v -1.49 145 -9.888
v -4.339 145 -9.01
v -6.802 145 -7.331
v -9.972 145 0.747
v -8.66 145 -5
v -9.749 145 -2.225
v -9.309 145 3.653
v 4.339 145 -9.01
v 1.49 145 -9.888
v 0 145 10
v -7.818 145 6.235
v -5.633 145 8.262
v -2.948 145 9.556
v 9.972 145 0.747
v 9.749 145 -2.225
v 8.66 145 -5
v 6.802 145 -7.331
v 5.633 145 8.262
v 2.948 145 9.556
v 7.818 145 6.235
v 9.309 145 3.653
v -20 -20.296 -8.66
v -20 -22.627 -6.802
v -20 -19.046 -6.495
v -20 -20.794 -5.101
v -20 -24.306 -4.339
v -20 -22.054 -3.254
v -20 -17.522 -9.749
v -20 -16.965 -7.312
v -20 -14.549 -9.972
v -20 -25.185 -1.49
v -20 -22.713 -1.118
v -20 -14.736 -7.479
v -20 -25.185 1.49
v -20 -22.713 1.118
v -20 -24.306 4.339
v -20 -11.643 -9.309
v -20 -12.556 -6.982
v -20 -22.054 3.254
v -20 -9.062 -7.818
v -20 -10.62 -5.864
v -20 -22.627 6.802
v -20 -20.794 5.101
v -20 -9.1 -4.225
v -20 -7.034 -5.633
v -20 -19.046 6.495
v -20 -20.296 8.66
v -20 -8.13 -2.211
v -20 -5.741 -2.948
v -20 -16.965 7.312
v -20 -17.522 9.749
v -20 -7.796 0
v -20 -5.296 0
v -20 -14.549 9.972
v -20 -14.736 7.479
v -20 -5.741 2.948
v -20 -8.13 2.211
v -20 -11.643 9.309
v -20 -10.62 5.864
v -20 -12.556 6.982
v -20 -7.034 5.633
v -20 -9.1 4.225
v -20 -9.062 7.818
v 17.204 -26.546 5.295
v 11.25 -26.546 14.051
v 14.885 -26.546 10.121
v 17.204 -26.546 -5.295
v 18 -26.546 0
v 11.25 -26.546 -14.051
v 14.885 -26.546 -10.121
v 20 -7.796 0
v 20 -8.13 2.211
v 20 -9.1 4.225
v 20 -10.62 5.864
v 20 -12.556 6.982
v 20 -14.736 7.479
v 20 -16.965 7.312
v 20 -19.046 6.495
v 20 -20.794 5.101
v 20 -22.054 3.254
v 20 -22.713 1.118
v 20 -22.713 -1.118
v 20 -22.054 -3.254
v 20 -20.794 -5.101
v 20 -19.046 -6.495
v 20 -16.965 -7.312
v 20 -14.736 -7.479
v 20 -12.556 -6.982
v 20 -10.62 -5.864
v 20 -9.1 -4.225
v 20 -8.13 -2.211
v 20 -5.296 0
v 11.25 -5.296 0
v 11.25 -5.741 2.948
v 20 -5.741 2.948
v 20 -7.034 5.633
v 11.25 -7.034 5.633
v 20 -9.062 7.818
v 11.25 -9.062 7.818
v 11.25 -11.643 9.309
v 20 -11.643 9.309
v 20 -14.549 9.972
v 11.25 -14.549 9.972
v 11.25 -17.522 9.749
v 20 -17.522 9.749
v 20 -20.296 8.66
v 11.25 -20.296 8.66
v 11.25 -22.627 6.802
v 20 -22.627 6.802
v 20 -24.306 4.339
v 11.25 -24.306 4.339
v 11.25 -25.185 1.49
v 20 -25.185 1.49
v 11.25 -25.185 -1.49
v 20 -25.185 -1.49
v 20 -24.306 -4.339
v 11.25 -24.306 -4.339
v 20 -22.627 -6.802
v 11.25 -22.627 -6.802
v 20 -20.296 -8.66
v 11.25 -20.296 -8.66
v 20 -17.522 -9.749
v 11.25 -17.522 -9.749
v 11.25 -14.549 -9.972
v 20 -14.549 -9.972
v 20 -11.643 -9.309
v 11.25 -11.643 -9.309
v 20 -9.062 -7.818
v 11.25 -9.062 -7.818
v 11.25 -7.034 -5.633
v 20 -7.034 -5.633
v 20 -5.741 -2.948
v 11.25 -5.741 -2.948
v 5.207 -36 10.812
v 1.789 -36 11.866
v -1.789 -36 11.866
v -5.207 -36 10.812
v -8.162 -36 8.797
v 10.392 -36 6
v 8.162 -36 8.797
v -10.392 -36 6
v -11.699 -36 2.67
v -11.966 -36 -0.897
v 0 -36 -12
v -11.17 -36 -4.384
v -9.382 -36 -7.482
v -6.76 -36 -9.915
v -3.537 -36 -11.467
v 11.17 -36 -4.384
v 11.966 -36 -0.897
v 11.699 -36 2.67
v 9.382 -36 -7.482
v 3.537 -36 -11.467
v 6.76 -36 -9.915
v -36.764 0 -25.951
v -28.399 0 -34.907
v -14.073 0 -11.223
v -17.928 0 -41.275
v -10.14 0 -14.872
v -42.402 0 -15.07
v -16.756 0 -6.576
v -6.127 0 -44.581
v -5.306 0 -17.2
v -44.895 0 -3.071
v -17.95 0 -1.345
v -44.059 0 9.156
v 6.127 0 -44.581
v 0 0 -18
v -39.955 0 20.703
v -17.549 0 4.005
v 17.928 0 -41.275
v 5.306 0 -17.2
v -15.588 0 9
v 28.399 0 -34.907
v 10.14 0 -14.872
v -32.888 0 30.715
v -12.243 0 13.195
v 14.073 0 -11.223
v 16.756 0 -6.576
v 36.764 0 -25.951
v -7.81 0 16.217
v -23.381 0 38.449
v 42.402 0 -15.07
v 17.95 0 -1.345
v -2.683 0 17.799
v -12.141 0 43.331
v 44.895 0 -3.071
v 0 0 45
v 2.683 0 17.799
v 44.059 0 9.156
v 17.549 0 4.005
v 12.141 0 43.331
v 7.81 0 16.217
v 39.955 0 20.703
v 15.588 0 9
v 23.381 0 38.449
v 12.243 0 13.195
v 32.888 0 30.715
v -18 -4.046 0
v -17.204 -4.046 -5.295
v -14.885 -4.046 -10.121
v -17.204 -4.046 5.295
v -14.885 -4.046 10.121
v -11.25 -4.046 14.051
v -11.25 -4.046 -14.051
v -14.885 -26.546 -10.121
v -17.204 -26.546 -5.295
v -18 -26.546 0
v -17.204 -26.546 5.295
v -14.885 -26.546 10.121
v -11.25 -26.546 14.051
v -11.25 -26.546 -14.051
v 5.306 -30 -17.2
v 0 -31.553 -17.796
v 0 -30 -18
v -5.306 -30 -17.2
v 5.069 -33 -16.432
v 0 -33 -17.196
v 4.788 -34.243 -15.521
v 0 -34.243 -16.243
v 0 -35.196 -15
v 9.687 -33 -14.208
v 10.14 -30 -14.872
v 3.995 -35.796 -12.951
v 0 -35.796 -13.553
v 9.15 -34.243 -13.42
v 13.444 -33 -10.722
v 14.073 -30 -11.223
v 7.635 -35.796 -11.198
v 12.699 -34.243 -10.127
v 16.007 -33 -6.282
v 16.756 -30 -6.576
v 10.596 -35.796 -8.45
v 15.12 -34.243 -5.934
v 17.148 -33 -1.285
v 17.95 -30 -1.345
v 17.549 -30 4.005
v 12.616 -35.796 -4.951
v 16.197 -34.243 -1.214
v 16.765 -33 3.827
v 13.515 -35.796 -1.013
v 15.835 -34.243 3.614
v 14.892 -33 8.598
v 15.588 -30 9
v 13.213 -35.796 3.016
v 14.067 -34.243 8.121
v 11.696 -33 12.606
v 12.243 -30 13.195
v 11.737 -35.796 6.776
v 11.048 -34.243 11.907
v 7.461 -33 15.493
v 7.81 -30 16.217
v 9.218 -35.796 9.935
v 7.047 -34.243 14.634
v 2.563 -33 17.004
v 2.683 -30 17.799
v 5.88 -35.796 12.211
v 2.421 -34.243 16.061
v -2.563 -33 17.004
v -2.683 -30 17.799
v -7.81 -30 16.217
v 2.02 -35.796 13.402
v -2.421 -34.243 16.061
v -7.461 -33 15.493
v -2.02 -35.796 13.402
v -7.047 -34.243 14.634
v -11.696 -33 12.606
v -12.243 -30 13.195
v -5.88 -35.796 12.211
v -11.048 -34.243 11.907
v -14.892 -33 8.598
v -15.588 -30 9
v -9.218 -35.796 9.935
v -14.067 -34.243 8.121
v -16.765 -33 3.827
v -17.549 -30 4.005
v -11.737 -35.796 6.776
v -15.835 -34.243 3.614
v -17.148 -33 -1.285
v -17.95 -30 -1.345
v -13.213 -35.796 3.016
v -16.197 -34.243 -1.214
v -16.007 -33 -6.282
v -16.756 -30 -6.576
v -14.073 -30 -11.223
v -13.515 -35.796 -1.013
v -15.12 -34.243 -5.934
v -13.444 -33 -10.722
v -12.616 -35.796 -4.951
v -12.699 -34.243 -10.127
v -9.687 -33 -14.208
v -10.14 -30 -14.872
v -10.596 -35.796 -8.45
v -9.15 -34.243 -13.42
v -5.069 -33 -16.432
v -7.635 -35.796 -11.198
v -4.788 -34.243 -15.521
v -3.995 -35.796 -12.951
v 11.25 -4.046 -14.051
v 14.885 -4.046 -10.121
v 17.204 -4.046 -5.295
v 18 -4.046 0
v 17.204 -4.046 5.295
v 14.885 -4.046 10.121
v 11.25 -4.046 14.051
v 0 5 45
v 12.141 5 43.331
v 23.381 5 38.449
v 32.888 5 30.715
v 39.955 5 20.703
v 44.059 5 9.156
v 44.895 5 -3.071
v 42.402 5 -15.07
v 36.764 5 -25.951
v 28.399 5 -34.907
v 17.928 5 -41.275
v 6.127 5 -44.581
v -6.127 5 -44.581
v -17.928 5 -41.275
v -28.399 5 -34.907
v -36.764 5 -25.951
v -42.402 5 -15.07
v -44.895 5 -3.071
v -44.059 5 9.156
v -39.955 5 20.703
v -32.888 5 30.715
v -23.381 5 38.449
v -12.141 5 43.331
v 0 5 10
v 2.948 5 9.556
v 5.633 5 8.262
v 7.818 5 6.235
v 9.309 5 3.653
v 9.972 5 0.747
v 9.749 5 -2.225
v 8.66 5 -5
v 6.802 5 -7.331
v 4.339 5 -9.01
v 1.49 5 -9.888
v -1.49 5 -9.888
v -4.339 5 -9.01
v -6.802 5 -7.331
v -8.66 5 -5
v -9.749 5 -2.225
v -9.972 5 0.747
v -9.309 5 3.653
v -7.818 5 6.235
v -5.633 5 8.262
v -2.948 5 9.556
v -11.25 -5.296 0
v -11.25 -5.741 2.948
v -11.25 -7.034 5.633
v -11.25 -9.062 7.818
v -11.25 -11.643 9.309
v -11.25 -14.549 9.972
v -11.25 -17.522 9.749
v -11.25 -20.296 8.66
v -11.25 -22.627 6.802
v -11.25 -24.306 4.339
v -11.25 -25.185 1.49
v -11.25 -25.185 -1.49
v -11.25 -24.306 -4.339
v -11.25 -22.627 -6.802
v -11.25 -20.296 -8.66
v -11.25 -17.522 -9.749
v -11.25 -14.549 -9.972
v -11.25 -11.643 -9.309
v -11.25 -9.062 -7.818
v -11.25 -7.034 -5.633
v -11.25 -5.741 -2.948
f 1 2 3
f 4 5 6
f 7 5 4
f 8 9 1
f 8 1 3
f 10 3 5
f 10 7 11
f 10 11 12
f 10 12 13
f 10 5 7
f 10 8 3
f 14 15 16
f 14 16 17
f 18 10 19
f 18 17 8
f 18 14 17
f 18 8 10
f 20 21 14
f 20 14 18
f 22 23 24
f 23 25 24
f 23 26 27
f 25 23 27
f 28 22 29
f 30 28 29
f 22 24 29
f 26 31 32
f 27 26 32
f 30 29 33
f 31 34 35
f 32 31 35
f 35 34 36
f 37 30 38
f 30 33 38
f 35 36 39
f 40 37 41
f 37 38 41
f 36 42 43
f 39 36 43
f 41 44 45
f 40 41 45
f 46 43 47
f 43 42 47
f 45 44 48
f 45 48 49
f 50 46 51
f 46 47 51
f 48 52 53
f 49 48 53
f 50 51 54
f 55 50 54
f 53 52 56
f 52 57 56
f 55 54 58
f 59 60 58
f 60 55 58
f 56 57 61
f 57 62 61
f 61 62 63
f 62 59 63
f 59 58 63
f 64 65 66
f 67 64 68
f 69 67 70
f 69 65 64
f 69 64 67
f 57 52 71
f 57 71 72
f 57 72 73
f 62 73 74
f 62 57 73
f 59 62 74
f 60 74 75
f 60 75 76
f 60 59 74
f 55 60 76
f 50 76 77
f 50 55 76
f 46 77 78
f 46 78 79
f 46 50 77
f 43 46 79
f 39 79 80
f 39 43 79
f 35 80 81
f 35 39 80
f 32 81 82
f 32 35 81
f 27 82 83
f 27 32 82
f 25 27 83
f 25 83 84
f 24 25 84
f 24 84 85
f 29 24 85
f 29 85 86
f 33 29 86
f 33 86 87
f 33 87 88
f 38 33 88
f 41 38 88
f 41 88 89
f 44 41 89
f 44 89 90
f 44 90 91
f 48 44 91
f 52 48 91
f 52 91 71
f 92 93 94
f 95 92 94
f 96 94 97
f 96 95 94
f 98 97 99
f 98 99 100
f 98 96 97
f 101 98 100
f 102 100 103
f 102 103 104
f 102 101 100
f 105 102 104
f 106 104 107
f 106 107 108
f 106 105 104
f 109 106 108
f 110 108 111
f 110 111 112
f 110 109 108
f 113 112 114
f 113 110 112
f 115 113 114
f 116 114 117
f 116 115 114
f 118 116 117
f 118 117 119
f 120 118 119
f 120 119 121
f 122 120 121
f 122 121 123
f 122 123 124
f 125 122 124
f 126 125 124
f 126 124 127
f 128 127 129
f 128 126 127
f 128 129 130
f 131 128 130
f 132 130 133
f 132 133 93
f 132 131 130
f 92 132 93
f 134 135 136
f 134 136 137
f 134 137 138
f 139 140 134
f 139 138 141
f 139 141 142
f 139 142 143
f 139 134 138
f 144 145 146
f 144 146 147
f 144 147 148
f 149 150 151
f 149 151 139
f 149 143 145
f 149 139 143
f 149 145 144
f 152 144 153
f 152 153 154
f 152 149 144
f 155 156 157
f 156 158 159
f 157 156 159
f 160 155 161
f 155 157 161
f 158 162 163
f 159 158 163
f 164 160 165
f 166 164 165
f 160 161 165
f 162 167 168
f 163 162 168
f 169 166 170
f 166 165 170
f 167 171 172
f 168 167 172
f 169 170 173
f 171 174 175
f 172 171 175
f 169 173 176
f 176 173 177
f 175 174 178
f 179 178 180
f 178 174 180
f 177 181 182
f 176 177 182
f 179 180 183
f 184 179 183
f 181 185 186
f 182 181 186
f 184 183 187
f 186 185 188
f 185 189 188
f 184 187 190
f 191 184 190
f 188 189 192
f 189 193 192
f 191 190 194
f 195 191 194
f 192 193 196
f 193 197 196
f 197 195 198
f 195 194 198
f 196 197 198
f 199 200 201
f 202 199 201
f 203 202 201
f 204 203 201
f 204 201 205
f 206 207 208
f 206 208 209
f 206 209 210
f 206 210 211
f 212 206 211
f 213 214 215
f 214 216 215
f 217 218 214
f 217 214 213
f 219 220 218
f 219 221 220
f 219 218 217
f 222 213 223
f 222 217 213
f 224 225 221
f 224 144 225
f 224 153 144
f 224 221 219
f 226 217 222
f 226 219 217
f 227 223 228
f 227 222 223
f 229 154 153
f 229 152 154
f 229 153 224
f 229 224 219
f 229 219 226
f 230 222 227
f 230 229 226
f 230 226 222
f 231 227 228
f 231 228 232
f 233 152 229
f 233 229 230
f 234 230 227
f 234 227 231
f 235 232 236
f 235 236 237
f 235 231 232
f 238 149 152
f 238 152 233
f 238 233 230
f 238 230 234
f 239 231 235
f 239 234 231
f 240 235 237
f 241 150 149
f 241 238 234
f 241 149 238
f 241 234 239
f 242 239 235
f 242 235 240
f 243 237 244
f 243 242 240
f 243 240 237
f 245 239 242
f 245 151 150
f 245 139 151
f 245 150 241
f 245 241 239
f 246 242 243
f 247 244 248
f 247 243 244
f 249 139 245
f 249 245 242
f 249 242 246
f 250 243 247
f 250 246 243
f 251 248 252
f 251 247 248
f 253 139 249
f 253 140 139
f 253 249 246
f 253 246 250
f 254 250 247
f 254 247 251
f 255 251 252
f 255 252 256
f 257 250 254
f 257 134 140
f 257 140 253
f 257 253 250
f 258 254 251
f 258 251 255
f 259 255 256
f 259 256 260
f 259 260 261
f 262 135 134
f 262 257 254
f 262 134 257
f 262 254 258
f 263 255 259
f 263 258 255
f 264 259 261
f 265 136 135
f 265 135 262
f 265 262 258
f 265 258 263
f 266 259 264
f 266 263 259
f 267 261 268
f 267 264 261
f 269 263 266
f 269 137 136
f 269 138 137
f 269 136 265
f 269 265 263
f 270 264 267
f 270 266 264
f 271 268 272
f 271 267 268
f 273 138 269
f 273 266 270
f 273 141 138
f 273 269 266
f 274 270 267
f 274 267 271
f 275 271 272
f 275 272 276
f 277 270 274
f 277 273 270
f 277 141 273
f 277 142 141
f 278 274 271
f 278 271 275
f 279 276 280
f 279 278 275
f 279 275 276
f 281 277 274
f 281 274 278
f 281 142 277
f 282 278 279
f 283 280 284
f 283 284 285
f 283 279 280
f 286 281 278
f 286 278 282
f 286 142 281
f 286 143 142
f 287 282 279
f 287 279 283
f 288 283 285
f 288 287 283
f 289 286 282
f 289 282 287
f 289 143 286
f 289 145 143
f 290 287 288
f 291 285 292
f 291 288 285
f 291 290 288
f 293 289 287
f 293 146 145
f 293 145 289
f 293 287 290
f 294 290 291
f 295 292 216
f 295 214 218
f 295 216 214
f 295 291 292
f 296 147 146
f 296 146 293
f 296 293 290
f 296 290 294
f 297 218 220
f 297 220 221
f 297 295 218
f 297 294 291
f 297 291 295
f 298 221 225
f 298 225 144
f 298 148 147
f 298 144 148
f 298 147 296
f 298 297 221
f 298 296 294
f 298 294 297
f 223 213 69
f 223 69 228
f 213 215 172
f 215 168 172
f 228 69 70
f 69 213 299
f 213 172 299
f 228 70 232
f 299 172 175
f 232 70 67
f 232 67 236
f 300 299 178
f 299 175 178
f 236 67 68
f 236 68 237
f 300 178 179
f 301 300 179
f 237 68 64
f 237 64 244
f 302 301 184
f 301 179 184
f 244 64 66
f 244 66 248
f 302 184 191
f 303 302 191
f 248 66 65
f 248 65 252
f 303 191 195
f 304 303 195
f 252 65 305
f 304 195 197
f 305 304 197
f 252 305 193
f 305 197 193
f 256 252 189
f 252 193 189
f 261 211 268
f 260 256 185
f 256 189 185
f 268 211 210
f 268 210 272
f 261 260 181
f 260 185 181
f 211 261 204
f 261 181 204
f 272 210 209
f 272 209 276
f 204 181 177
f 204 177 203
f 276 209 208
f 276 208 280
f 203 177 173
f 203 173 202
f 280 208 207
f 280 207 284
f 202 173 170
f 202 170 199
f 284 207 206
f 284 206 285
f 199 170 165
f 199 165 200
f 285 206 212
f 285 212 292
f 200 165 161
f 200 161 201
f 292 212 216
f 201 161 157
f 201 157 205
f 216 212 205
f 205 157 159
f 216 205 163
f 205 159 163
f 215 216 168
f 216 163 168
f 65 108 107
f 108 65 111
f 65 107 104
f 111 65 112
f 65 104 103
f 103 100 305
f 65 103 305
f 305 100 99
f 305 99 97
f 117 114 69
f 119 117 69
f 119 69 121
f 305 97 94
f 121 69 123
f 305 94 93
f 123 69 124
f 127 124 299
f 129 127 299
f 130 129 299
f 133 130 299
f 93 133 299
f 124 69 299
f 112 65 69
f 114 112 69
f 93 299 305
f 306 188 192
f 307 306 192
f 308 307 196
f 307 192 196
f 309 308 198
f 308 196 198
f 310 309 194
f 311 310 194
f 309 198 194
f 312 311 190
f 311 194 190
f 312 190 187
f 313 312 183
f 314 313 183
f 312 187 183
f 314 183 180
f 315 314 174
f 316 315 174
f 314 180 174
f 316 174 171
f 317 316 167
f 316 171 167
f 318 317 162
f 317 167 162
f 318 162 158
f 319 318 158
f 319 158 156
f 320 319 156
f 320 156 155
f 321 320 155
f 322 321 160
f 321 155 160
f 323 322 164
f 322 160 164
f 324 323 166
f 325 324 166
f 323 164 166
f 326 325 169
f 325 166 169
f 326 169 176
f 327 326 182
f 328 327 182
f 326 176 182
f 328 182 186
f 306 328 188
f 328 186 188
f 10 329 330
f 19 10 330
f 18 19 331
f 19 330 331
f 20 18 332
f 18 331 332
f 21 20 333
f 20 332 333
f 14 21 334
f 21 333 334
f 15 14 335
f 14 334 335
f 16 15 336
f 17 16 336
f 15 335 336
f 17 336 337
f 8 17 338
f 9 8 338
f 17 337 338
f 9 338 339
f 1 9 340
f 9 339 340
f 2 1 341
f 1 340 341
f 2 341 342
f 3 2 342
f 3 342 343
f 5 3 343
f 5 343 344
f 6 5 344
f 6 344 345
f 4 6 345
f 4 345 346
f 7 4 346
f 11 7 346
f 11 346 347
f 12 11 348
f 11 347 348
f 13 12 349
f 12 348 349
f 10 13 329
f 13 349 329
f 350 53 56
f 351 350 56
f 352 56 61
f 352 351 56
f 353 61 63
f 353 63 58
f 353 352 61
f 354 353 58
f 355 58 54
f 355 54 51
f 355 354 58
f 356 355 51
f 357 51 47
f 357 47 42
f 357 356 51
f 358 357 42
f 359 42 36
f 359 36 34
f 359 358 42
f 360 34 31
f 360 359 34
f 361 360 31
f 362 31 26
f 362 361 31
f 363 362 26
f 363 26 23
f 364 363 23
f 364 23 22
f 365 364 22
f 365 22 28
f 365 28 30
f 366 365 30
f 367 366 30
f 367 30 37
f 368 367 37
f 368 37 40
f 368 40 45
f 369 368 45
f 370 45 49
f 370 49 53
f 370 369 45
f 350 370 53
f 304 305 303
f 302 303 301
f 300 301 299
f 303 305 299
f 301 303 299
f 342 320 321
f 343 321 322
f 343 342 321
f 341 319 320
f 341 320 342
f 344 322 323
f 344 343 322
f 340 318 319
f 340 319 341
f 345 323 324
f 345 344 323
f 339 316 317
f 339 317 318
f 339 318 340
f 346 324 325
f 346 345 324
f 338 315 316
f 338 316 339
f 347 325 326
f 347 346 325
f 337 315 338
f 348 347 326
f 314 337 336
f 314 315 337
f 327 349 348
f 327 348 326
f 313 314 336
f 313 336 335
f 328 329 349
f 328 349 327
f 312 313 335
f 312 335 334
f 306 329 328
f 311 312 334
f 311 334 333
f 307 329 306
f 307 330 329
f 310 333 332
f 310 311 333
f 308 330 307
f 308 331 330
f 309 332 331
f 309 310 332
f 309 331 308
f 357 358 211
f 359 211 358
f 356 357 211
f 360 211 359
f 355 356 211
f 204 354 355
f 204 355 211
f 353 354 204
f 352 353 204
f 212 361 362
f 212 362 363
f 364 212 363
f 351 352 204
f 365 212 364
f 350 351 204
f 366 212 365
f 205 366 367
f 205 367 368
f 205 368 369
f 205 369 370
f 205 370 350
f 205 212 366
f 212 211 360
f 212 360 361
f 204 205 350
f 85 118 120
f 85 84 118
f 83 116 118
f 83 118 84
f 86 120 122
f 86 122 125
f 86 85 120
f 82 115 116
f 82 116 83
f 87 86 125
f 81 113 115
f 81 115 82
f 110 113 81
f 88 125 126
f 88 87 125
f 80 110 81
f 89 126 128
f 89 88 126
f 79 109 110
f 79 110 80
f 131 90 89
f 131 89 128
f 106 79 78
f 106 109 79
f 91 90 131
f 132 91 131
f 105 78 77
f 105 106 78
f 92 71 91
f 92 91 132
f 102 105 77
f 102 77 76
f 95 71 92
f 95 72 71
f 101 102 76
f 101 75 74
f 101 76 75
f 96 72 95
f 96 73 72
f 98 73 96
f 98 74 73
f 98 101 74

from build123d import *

# Parameters (mm, degrees)
SKETCH1_R               = 45
BOSS_EXTRUDE1_DEPTH     = 5
SKETCH2_R               = 10
BOSS_EXTRUDE2_DEPTH     = 140
SKETCH3_R               = 18
BOSS_EXTRUDE3_DEPTH     = 36
FILLET1_R               = 6
CUT_EXTRUDE1_DEPTH      = 159.350876221
CUT_EXTRUDE1_DEPTH_BACK = 159.350876221
SKETCH4_W               = 21.648814377
SKETCH4_H               = 22.5
SKETCH5_R               = 7.5
CUT_EXTRUDE2_DEPTH      = 162.907573943
SKETCH7_R               = 10
SKETCH7_R_2             = 7.5
BOSS_EXTRUDE4_DEPTH     = 20


with BuildPart() as part:
    # Sketch1 → Boss-Extrude1 (new body)
    with BuildSketch(Plane(origin=(0, 0, 0), x_dir=(1, 0, 0), z_dir=(0, 1, 0))):
        with Locations(Location((0, 0, 0), (0, 0, 270))):
            Circle(SKETCH1_R)
    extrude(amount=BOSS_EXTRUDE1_DEPTH)

    # Sketch2 → Boss-Extrude2 (add)
    with BuildSketch(Plane(origin=(0, 5, 0), x_dir=(1, 0, 0), z_dir=(0, 1, 0))):
        with Locations(Location((0, 0, 0), (0, 0, 270))):
            Circle(SKETCH2_R)
    extrude(amount=BOSS_EXTRUDE2_DEPTH)

    # Sketch3 → Boss-Extrude3 (add)
    with BuildSketch(Plane.XZ):
        with Locations(Location((0, 0, 0), (0, 0, 270))):
            Circle(SKETCH3_R)
    extrude(amount=BOSS_EXTRUDE3_DEPTH)

    # Fillet1
    fillet1_edges = [part.edges().sort_by_distance(p)[0] for p in [
        (0, -36, 18),
    ]]
    fillet(fillet1_edges, radius=FILLET1_R)

    # Sketch4 → Cut-Extrude1 (cut, two sides: drawn at the far end of the back side and taken through both)
    with BuildSketch(Plane.XY.offset(-CUT_EXTRUDE1_DEPTH_BACK)):
        with Locations((22.074407189, -15.296408269)):
            Rectangle(SKETCH4_W, SKETCH4_H)
        with Locations((-22.074407189, -15.296408269)):
            Rectangle(SKETCH4_W, SKETCH4_H)
    extrude(amount=CUT_EXTRUDE1_DEPTH + CUT_EXTRUDE1_DEPTH_BACK, mode=Mode.SUBTRACT)

    # Sketch5 → Cut-Extrude2 (cut, through all)
    with BuildSketch(Plane(origin=(11.25, 0, 0), x_dir=(0, 0, -1), z_dir=(1, 0, 0))):
        with Locations(Location((0, -15.296408269, 0), (0, 0, 90))):
            Circle(SKETCH5_R)
    extrude(amount=-CUT_EXTRUDE2_DEPTH, mode=Mode.SUBTRACT)

    # Sketch7 → Boss-Extrude4 (add, symmetric)
    with BuildSketch(Plane(origin=(0, 0, 0), x_dir=(0, 0, -1), z_dir=(1, 0, 0))):
        with Locations(Location((0, -15.296408269, 0), (0, 0, 90))):
            Circle(SKETCH7_R)
        with Locations(Location((0, -15.296408269, 0), (0, 0, 90))):
            Circle(SKETCH7_R_2, mode=Mode.SUBTRACT)
    extrude(amount=BOSS_EXTRUDE4_DEPTH, both=True)


solid = part.part
